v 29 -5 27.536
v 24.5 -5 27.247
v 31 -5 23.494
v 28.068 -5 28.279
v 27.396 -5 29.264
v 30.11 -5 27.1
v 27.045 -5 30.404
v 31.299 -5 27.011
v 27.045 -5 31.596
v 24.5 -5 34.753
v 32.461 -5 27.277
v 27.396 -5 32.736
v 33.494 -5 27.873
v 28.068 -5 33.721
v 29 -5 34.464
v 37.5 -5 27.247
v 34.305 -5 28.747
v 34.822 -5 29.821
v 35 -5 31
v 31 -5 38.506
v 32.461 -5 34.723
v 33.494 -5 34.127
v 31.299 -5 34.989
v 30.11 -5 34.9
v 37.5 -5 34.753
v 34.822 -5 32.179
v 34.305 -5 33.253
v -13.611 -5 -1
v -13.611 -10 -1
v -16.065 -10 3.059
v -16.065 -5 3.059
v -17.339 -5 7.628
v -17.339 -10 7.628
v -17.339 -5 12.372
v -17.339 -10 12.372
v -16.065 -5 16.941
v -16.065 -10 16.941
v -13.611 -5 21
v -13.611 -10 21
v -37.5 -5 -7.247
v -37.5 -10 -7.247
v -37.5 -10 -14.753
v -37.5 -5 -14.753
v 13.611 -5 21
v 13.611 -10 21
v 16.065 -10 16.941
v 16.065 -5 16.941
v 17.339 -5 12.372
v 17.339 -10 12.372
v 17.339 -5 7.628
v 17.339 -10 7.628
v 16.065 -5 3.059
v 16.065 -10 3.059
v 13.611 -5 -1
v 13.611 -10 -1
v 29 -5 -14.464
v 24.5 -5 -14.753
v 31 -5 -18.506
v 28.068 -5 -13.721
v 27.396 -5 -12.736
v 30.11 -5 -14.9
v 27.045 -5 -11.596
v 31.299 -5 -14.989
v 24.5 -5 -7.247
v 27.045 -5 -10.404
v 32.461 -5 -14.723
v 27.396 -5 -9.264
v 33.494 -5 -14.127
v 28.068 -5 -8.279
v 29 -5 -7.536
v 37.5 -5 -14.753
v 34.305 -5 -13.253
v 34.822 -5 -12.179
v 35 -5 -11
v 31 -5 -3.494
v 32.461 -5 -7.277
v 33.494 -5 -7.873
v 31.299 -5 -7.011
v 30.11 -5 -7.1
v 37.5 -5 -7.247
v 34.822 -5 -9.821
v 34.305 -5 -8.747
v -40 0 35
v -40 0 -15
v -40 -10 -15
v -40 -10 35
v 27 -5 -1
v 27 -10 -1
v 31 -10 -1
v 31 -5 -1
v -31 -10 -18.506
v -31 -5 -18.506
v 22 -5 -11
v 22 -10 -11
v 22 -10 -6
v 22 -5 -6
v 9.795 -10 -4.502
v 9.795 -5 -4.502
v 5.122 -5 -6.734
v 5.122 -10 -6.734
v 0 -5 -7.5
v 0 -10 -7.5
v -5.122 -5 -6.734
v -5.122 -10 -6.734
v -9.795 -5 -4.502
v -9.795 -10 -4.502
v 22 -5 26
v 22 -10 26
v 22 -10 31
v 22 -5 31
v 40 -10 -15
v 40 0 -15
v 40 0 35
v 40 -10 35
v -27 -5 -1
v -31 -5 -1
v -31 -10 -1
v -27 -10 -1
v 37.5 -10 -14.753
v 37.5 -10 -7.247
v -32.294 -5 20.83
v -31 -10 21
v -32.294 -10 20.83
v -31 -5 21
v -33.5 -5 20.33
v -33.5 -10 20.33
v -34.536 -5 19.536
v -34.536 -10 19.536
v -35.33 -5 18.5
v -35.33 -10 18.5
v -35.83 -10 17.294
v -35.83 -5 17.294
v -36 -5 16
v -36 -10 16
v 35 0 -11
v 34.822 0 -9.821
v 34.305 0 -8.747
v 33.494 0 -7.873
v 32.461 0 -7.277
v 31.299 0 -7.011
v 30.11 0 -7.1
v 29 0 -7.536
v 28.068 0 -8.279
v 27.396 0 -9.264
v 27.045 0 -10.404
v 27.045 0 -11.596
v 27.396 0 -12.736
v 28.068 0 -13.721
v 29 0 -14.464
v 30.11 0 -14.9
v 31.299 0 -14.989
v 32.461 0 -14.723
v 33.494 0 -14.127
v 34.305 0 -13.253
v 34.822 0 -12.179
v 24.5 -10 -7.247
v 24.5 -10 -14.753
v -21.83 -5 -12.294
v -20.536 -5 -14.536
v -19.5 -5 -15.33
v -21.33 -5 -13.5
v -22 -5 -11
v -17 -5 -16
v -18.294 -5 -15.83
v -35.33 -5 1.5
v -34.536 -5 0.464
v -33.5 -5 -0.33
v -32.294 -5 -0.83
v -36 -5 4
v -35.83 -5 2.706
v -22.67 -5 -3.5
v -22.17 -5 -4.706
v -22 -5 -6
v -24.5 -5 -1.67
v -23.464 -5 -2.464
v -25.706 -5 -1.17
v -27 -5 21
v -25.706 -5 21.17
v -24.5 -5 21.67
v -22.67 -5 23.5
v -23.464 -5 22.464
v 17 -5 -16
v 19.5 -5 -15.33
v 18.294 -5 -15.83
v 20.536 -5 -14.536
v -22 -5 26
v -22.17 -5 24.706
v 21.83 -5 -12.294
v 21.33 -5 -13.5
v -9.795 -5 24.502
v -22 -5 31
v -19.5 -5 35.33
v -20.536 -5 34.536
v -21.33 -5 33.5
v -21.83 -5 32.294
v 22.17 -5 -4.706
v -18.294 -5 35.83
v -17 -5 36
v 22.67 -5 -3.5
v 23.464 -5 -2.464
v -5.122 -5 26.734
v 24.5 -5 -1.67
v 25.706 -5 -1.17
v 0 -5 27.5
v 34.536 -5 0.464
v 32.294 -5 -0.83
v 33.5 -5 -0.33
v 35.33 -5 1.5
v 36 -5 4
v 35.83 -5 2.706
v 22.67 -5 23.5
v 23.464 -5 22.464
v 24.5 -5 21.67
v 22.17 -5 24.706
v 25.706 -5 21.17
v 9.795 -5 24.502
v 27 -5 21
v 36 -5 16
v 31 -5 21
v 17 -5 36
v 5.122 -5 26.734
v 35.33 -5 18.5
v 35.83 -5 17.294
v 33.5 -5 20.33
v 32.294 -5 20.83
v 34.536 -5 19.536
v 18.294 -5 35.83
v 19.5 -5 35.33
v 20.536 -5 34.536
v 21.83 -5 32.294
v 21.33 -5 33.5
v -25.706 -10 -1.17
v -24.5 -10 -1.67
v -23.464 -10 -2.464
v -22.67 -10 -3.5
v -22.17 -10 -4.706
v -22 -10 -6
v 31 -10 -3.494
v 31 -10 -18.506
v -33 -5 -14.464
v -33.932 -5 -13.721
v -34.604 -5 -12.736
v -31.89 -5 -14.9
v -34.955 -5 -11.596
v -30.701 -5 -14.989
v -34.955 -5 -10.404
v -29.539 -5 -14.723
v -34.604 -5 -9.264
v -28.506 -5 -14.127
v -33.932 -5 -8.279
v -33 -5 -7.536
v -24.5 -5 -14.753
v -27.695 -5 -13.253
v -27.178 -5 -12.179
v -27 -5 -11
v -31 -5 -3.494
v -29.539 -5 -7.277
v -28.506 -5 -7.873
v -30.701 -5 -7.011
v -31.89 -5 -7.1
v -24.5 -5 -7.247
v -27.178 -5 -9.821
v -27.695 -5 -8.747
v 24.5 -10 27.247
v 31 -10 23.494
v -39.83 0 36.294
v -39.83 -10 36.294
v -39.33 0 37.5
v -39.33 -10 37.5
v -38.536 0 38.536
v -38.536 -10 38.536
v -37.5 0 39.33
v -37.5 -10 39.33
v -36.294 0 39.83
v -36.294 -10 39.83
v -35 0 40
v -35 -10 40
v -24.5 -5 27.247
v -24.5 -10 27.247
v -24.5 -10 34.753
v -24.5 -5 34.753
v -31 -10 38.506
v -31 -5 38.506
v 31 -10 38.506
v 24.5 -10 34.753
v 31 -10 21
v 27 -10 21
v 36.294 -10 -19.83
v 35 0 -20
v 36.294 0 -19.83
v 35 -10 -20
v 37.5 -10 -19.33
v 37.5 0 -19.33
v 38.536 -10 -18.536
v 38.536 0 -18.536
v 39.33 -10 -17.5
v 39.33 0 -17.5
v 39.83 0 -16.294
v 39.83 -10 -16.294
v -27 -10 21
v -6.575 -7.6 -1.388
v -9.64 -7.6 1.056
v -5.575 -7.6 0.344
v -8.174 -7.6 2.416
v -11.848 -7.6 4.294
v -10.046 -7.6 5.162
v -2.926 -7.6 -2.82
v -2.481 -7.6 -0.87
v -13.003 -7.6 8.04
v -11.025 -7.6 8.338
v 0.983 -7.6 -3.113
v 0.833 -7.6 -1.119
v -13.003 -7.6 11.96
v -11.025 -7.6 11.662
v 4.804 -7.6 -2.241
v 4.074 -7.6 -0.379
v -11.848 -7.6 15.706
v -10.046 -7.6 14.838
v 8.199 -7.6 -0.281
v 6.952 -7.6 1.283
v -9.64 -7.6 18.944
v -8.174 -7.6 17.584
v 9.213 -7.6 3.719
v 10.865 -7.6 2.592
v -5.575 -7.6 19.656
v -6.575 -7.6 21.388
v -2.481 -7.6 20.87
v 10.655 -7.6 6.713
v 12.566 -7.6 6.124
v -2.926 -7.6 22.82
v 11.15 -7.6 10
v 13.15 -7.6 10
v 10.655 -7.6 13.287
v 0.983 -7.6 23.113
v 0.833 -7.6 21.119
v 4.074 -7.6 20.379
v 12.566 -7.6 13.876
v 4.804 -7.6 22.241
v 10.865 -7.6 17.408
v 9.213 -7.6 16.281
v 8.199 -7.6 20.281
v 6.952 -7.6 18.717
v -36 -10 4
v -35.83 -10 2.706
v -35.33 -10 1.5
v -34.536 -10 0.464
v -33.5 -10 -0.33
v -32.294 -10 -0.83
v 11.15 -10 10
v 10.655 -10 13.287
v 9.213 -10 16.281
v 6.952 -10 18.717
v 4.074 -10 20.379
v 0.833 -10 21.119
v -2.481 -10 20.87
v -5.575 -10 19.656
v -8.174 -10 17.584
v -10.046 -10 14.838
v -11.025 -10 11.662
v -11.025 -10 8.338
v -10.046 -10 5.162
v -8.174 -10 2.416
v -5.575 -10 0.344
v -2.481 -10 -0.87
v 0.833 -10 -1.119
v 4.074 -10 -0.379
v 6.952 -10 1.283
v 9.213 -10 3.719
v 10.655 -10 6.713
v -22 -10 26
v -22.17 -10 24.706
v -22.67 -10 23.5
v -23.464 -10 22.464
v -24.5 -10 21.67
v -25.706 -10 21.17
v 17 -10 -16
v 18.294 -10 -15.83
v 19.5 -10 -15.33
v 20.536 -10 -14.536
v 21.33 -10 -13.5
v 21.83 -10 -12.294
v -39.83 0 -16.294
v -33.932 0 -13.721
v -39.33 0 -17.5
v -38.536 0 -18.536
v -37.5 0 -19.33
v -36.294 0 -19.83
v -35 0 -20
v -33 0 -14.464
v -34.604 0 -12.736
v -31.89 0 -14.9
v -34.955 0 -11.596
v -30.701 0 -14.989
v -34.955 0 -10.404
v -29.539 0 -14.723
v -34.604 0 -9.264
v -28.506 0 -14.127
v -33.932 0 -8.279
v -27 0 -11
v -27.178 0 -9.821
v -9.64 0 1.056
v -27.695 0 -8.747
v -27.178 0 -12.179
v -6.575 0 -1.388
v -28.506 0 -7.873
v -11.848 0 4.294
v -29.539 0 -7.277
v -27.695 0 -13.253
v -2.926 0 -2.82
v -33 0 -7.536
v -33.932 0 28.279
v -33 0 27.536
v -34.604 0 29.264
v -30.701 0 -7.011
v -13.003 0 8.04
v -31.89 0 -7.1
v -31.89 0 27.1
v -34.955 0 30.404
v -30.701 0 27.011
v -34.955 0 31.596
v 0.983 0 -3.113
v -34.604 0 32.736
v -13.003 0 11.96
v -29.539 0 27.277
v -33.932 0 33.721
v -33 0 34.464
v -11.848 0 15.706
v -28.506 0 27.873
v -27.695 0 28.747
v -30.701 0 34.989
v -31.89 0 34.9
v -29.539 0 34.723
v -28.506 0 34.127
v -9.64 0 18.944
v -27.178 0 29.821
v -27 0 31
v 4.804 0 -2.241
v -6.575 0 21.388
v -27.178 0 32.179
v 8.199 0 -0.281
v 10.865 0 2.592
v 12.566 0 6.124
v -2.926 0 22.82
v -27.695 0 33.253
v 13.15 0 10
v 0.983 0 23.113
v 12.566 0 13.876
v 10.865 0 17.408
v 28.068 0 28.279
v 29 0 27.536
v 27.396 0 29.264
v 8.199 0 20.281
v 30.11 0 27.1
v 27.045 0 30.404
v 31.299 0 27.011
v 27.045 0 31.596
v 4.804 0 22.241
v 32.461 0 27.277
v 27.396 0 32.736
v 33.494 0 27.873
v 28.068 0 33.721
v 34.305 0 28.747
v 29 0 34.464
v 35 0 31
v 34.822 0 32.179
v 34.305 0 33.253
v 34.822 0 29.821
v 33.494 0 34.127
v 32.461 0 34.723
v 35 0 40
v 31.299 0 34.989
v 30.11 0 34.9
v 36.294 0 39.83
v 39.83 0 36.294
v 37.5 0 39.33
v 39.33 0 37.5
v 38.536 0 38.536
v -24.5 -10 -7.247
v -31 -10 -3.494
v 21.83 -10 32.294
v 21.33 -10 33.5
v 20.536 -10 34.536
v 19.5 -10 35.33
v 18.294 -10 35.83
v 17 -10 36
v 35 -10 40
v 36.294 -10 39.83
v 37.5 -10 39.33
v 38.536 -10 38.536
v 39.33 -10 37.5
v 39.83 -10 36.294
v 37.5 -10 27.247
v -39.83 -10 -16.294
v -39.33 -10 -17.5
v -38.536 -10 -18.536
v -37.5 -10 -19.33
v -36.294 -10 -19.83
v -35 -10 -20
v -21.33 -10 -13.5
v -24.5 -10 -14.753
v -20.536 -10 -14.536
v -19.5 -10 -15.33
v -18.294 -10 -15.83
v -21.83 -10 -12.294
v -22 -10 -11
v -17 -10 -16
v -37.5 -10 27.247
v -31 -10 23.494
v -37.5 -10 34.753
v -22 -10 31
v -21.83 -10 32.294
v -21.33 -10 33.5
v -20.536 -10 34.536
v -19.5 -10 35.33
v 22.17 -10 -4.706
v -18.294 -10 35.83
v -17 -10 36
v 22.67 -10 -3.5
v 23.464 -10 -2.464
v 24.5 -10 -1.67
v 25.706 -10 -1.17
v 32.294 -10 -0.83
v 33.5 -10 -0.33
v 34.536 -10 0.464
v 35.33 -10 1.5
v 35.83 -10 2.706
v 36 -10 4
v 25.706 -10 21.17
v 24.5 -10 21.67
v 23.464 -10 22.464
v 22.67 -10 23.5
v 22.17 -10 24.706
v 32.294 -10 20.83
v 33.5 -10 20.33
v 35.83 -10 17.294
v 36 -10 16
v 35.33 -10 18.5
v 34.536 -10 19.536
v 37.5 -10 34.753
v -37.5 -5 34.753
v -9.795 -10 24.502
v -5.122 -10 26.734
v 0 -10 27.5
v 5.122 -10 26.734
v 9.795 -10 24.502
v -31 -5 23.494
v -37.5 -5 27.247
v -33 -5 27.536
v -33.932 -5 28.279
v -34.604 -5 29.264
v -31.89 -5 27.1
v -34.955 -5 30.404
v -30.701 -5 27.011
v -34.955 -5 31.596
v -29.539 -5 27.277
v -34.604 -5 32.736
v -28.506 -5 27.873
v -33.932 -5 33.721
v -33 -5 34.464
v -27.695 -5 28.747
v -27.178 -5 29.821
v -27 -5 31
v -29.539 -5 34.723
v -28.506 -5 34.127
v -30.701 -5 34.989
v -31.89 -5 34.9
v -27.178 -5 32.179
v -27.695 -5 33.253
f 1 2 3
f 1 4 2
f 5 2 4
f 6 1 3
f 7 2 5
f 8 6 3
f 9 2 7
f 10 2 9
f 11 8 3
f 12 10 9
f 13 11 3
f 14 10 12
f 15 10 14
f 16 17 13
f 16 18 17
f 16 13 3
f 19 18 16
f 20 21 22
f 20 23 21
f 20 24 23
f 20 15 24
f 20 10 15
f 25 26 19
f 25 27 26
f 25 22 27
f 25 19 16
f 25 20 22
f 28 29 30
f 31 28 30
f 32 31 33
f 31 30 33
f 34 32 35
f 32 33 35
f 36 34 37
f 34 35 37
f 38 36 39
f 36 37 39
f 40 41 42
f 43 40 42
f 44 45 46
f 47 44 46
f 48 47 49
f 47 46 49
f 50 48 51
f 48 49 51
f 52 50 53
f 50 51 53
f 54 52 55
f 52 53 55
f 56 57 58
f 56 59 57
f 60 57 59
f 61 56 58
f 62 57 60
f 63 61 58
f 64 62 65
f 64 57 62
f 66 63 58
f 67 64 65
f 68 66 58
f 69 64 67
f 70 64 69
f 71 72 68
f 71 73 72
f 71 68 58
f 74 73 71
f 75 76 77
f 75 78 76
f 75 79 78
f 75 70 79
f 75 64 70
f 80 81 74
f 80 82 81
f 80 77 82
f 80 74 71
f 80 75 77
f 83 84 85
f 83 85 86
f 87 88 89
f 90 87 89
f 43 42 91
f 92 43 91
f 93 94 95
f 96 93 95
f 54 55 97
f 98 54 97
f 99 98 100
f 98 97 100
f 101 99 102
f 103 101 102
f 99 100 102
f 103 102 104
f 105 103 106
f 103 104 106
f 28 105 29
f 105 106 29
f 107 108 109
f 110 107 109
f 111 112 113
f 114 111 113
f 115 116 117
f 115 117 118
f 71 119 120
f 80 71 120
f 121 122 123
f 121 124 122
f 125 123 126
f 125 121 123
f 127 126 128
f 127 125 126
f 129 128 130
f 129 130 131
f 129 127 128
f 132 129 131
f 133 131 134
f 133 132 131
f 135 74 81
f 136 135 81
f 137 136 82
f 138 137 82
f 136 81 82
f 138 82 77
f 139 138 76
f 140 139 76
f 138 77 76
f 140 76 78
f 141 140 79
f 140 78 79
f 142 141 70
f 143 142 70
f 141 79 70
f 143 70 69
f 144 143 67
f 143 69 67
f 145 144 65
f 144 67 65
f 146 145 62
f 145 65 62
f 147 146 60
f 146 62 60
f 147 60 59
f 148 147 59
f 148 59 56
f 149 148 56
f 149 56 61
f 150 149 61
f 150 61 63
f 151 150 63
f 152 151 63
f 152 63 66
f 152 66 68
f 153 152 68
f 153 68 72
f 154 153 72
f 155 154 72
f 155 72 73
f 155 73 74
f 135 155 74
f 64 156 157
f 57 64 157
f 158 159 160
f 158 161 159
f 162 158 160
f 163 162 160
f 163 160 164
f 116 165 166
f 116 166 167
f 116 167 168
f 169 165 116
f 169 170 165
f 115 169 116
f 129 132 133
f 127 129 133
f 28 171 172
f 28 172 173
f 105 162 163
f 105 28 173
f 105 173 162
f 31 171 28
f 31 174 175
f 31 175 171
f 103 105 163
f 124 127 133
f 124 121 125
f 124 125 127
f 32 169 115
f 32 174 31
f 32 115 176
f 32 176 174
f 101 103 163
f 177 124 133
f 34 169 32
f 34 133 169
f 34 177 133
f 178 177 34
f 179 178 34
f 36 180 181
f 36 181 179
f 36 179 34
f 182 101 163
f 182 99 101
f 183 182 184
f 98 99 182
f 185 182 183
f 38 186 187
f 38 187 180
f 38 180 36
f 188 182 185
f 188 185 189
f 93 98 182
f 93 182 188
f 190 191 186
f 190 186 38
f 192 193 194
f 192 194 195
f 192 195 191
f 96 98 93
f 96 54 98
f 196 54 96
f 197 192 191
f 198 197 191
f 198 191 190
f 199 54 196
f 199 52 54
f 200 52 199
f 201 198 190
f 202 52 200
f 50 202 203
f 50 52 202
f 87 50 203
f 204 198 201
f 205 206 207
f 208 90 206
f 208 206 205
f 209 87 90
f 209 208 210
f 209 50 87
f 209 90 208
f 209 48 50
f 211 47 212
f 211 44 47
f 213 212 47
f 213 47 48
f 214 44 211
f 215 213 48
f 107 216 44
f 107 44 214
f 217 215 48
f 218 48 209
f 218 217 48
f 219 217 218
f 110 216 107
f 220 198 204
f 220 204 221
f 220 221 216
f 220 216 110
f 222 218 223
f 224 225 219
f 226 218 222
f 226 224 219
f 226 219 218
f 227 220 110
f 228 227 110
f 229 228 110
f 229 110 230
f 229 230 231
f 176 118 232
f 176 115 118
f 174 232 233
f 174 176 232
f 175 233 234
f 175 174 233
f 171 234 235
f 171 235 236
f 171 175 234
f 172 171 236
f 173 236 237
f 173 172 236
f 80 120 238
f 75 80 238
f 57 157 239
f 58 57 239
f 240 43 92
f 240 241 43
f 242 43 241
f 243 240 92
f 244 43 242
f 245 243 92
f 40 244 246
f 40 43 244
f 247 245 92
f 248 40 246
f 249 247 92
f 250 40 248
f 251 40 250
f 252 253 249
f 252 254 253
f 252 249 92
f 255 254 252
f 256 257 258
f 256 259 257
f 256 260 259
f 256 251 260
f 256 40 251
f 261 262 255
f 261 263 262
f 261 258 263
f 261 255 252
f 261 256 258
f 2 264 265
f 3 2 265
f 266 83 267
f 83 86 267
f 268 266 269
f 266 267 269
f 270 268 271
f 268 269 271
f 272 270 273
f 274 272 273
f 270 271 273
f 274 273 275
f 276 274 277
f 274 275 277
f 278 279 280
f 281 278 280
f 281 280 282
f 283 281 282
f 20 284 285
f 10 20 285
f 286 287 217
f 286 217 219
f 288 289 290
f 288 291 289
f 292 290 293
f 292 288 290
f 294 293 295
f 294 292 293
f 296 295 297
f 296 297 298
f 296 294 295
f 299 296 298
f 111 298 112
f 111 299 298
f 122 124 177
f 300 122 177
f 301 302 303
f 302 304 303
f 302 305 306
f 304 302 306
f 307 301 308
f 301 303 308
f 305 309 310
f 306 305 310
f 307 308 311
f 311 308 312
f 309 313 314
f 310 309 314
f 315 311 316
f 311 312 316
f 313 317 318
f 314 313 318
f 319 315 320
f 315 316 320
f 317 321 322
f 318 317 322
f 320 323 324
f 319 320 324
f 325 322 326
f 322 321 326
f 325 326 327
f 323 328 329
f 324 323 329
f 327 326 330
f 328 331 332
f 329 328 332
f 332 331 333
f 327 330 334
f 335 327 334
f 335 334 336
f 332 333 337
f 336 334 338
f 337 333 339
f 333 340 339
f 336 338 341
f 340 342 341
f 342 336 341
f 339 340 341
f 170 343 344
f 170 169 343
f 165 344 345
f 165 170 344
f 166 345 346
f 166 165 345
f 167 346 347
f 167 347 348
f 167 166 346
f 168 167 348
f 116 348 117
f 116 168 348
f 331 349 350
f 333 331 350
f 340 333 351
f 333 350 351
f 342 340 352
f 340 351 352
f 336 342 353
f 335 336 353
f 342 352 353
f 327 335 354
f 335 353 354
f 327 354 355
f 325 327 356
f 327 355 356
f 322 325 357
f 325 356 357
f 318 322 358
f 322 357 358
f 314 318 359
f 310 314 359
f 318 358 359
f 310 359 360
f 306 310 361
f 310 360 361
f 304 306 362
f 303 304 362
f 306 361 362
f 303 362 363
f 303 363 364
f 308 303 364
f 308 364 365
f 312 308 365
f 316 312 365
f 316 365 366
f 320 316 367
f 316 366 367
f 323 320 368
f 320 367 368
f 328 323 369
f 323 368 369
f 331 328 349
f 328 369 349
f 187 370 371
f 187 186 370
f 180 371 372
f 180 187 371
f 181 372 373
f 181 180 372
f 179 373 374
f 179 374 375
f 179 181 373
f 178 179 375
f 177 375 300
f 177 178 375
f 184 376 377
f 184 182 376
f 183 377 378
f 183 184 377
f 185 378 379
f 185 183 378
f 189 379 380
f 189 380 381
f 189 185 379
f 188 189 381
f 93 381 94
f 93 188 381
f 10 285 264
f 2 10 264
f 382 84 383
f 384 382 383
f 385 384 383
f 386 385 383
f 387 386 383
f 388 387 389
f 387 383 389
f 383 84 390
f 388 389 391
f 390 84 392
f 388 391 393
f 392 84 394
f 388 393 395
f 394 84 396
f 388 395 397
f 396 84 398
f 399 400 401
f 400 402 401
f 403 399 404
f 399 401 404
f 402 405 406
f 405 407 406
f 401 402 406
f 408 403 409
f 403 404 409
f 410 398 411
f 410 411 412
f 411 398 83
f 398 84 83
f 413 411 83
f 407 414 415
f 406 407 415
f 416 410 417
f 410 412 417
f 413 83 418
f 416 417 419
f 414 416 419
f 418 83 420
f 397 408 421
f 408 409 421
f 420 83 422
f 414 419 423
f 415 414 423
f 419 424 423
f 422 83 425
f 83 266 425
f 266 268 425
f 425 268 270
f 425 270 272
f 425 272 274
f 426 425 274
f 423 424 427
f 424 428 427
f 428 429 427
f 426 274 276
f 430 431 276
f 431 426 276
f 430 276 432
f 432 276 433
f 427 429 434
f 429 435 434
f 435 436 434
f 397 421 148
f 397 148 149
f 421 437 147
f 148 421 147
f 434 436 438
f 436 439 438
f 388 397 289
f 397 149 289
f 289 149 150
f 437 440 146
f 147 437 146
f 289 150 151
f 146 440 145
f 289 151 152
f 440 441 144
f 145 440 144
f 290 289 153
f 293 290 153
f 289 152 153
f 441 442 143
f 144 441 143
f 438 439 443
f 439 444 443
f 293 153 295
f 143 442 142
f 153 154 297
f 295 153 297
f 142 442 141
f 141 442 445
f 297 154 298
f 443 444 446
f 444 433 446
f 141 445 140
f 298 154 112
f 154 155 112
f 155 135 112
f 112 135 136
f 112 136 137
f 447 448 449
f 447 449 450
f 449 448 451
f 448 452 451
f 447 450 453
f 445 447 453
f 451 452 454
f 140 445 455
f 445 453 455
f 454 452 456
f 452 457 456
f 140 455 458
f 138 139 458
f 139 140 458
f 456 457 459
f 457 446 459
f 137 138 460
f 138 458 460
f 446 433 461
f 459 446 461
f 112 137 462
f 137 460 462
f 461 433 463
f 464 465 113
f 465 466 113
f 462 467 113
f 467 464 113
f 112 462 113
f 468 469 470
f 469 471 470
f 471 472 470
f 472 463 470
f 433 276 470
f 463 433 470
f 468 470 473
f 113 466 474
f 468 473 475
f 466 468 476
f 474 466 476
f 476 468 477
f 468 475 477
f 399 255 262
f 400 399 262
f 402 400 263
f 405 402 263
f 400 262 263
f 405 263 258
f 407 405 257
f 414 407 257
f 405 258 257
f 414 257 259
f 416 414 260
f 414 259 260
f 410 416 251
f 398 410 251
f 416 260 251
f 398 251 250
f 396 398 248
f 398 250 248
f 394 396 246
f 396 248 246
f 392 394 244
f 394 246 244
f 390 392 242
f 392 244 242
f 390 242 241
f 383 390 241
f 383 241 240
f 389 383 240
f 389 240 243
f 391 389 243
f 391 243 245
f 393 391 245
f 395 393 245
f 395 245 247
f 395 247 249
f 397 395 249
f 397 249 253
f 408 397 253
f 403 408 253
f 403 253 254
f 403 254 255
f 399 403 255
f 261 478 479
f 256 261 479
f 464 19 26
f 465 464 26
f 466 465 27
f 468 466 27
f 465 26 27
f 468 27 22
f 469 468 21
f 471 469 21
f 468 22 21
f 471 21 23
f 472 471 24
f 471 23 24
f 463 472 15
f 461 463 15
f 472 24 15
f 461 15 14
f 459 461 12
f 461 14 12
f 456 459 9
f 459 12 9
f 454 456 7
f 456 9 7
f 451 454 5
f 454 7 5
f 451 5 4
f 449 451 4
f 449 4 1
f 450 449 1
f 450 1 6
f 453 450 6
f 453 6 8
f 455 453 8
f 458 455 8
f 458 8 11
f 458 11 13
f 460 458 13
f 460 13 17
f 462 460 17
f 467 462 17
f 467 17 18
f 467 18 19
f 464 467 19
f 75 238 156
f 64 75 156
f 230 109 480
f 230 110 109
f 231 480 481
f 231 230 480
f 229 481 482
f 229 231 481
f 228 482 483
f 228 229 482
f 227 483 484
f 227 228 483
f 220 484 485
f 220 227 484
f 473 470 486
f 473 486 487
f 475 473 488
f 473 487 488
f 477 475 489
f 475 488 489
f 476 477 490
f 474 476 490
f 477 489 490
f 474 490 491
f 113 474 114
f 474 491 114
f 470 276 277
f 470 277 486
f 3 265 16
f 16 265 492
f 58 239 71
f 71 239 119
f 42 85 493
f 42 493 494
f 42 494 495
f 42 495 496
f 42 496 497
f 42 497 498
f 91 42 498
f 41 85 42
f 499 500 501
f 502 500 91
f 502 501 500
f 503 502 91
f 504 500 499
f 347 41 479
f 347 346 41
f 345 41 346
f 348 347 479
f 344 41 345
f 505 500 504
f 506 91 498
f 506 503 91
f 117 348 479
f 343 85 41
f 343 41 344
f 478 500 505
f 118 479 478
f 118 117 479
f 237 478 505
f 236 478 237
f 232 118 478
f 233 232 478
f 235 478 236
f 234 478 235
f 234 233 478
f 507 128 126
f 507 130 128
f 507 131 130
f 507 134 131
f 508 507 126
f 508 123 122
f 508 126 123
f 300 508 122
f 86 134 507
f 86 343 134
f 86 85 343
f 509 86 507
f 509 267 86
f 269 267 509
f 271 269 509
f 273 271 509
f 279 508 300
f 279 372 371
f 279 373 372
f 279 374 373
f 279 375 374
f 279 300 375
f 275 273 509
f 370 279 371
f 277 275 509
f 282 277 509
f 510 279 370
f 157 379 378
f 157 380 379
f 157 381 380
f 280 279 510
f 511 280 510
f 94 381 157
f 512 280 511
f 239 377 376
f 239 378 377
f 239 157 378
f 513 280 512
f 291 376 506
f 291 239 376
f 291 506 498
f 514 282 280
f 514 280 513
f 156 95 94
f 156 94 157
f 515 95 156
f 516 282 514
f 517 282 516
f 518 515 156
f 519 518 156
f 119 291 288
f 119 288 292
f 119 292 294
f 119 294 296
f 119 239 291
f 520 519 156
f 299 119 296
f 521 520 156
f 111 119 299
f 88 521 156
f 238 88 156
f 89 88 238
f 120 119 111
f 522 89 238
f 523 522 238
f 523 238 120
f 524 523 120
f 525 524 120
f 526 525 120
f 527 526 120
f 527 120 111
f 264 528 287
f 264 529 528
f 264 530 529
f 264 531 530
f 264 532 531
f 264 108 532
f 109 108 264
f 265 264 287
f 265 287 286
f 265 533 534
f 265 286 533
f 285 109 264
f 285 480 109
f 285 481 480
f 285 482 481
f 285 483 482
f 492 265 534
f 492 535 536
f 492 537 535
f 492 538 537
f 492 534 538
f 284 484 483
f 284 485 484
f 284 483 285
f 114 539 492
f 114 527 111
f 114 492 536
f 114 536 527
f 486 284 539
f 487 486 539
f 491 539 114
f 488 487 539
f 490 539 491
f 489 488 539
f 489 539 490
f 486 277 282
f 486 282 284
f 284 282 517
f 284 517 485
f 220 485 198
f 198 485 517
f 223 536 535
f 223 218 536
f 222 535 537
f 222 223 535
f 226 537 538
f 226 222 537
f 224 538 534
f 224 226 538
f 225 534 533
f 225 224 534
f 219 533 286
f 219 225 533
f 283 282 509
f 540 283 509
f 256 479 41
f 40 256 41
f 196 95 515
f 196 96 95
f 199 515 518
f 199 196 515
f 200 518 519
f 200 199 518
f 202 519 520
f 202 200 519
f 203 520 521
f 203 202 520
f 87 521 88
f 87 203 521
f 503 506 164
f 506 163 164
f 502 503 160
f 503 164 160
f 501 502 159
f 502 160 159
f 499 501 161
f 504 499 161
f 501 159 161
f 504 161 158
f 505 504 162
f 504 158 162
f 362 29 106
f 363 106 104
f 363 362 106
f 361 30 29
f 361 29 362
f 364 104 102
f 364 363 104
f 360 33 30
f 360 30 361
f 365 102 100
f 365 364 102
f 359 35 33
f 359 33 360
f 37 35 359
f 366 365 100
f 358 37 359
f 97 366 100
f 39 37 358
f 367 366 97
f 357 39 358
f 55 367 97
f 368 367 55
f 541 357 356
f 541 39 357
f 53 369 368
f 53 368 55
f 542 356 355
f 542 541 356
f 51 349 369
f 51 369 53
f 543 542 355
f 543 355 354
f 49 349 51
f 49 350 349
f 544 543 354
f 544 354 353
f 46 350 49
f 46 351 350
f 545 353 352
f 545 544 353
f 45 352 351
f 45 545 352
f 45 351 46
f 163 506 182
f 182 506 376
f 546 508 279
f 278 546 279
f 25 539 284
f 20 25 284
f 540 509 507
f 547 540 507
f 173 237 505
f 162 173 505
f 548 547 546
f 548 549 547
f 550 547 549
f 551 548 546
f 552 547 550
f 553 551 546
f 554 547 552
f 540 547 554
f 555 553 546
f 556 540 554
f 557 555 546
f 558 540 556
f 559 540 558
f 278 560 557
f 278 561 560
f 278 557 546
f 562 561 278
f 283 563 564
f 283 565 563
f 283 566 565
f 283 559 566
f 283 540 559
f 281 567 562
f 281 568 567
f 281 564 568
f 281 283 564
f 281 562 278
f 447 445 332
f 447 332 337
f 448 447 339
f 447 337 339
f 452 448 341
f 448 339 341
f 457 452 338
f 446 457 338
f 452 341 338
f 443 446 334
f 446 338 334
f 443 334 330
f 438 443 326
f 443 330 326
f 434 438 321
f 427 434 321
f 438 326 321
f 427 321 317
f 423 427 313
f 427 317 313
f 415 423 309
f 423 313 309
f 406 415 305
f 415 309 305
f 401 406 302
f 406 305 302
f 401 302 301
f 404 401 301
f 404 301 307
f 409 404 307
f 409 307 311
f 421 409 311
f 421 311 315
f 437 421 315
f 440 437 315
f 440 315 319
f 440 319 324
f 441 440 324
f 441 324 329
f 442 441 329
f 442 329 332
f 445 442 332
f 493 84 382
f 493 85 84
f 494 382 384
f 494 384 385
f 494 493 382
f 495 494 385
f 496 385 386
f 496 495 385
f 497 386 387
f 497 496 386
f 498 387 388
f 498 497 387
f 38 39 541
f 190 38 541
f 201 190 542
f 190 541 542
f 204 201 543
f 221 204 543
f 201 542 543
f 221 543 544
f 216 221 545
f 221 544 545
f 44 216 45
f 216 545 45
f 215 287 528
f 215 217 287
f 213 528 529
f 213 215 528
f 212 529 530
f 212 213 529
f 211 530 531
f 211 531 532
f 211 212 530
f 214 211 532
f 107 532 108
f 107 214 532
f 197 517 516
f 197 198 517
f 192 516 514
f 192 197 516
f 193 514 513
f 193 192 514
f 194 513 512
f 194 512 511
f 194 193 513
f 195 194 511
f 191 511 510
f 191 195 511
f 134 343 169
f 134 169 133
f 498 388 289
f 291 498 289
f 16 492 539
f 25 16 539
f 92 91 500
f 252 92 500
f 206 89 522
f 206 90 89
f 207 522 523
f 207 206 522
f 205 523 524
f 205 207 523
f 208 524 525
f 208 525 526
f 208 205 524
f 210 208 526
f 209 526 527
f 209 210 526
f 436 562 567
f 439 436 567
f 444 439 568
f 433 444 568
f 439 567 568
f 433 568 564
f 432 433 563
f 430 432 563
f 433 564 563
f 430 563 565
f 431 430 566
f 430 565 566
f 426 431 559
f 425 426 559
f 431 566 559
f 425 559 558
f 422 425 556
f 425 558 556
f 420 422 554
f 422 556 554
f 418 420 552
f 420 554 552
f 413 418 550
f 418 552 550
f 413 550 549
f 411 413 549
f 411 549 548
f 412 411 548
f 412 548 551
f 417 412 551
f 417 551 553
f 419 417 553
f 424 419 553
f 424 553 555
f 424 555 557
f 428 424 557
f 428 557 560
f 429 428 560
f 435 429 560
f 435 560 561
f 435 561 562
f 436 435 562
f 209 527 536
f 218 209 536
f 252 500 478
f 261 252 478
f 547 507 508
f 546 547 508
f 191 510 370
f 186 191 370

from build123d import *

# Parameters (mm, degrees)
F0_W      = 80
F0_H      = 60
F1_DEPTH  = 10
F2_R      = 13.15
F3_DEPTH  = 10.001
F4_R      = 4
F5_DEPTH  = 10.001
F6_R      = 5
F7_W      = 14
F7_H      = 22
F8_DEPTH  = 5
F9_R      = 5
F10_R     = 13.15
F10_R_2   = 11.15
F11_DEPTH = 2.4


with BuildPart() as f1:
    # F0 (on Front) → F1 (new body)
    with BuildSketch(Plane.XZ):
        with Locations((0, 10)):
            Rectangle(F0_W, F0_H)
    extrude(amount=F1_DEPTH)

    # F2 (on face) → F3 (cut, through all)
    with BuildSketch(Plane.XZ.offset(10)):
        with Locations((0, 10)):
            Circle(F2_R)
    extrude(amount=-F3_DEPTH, mode=Mode.SUBTRACT)

    # F4 (on face) → F5 (cut, through all)
    with BuildSketch(Plane.XZ.offset(10)):
        with Locations((-31, 31)):
            Circle(F4_R)
        with Locations((31, 31)):
            Circle(F4_R)
        with Locations((-31, -11)):
            Circle(F4_R)
        with Locations((31, -11)):
            Circle(F4_R)
    extrude(amount=-F5_DEPTH, mode=Mode.SUBTRACT)

    # F6
    f6_edges = [f1.edges().sort_by_distance(p)[0] for p in [
        (40, -5, 40),
        (40, -5, -20),
        (-40, -5, -20),
        (-40, -5, 40),
    ]]
    fillet(f6_edges, radius=F6_R)

    # F7 (on face) → F8 (cut)
    with BuildSketch(Plane.XZ.offset(10)):
        Polygon((-24.5, 34.7527767497), (-31, 38.5055534995), (-37.5, 34.7527767497), (-37.5, 27.2472232503), (-31, 23.4944465005), (-24.5, 27.2472232503), align=None)
        Polygon((24.5, 34.7527767497), (24.5, 27.2472232503), (31, 23.4944465005), (37.5, 27.2472232503), (37.5, 34.7527767497), (31, 38.5055534995), align=None)
        Polygon((24.5, -7.2472232503), (24.5, -14.7527767497), (31, -18.5055534995), (37.5, -14.7527767497), (37.5, -7.2472232503), (31, -3.4944465005), align=None)
        Polygon((-24.5, -7.2472232503), (-31, -3.4944465005), (-37.5, -7.2472232503), (-37.5, -14.7527767497), (-31, -18.5055534995), (-24.5, -14.7527767497), align=None)
        with BuildLine():
            ThreePointArc((13.6106575888, 21), (16.499037969, 15.8336734651), (17.5, 10))
            ThreePointArc((17.5, 10), (16.499037969, 4.1663265349), (13.6106575888, -1))
            Line((13.6106575888, -1), (22, -1))
            Line((22, -1), (22, 21))
            Line((22, 21), (13.6106575888, 21))
        make_face()
        with BuildLine():
            ThreePointArc((-13.6106575888, 21), (0, 27.5), (13.6106575888, 21))
            Line((13.6106575888, 21), (22, 21))
            Line((22, 21), (22, 36))
            Line((22, 36), (-22, 36))
            Line((-22, 36), (-22, 21))
            Line((-22, 21), (-13.6106575888, 21))
        make_face()
        with BuildLine():
            Line((22, -1), (13.6106575888, -1))
            ThreePointArc((13.6106575888, -1), (0, -7.5), (-13.6106575888, -1))
            Line((-13.6106575888, -1), (-22, -1))
            Line((-22, -1), (-22, -16))
            Line((-22, -16), (22, -16))
            Line((22, -16), (22, -1))
        make_face()
        with BuildLine():
            ThreePointArc((-13.6106575888, -1), (-17.5, 10), (-13.6106575888, 21))
            Line((-13.6106575888, 21), (-22, 21))
            Line((-22, 21), (-22, -1))
            Line((-22, -1), (-13.6106575888, -1))
        make_face()
        with Locations((29, 10)):
            Rectangle(F7_W, F7_H)
        with Locations((-29, 10)):
            Rectangle(F7_W, F7_H)
    extrude(amount=-F8_DEPTH, mode=Mode.SUBTRACT)

    # F9
    f9_edges = [f1.edges().sort_by_distance(p)[0] for p in [
        (-22, -7.5, 21),
        (-36, -7.5, 21),
        (-22, -7.5, 36),
        (22, -7.5, 36),
        (22, -7.5, 21),
        (36, -7.5, 21),
        (-36, -7.5, -1),
        (-22, -7.5, -1),
        (-22, -7.5, -16),
        (36, -7.5, -1),
        (22, -7.5, -1),
        (22, -7.5, -16),
    ]]
    fillet(f9_edges, radius=F9_R)

    # F10 (on face) → F11 (join)
    with BuildSketch(Plane.XZ.offset(10)):
        with Locations((0, 10)):
            Circle(F10_R)
        with Locations((0, 10)):
            Circle(F10_R_2, mode=Mode.SUBTRACT)
    extrude(amount=-F11_DEPTH)


solid = f1.part
